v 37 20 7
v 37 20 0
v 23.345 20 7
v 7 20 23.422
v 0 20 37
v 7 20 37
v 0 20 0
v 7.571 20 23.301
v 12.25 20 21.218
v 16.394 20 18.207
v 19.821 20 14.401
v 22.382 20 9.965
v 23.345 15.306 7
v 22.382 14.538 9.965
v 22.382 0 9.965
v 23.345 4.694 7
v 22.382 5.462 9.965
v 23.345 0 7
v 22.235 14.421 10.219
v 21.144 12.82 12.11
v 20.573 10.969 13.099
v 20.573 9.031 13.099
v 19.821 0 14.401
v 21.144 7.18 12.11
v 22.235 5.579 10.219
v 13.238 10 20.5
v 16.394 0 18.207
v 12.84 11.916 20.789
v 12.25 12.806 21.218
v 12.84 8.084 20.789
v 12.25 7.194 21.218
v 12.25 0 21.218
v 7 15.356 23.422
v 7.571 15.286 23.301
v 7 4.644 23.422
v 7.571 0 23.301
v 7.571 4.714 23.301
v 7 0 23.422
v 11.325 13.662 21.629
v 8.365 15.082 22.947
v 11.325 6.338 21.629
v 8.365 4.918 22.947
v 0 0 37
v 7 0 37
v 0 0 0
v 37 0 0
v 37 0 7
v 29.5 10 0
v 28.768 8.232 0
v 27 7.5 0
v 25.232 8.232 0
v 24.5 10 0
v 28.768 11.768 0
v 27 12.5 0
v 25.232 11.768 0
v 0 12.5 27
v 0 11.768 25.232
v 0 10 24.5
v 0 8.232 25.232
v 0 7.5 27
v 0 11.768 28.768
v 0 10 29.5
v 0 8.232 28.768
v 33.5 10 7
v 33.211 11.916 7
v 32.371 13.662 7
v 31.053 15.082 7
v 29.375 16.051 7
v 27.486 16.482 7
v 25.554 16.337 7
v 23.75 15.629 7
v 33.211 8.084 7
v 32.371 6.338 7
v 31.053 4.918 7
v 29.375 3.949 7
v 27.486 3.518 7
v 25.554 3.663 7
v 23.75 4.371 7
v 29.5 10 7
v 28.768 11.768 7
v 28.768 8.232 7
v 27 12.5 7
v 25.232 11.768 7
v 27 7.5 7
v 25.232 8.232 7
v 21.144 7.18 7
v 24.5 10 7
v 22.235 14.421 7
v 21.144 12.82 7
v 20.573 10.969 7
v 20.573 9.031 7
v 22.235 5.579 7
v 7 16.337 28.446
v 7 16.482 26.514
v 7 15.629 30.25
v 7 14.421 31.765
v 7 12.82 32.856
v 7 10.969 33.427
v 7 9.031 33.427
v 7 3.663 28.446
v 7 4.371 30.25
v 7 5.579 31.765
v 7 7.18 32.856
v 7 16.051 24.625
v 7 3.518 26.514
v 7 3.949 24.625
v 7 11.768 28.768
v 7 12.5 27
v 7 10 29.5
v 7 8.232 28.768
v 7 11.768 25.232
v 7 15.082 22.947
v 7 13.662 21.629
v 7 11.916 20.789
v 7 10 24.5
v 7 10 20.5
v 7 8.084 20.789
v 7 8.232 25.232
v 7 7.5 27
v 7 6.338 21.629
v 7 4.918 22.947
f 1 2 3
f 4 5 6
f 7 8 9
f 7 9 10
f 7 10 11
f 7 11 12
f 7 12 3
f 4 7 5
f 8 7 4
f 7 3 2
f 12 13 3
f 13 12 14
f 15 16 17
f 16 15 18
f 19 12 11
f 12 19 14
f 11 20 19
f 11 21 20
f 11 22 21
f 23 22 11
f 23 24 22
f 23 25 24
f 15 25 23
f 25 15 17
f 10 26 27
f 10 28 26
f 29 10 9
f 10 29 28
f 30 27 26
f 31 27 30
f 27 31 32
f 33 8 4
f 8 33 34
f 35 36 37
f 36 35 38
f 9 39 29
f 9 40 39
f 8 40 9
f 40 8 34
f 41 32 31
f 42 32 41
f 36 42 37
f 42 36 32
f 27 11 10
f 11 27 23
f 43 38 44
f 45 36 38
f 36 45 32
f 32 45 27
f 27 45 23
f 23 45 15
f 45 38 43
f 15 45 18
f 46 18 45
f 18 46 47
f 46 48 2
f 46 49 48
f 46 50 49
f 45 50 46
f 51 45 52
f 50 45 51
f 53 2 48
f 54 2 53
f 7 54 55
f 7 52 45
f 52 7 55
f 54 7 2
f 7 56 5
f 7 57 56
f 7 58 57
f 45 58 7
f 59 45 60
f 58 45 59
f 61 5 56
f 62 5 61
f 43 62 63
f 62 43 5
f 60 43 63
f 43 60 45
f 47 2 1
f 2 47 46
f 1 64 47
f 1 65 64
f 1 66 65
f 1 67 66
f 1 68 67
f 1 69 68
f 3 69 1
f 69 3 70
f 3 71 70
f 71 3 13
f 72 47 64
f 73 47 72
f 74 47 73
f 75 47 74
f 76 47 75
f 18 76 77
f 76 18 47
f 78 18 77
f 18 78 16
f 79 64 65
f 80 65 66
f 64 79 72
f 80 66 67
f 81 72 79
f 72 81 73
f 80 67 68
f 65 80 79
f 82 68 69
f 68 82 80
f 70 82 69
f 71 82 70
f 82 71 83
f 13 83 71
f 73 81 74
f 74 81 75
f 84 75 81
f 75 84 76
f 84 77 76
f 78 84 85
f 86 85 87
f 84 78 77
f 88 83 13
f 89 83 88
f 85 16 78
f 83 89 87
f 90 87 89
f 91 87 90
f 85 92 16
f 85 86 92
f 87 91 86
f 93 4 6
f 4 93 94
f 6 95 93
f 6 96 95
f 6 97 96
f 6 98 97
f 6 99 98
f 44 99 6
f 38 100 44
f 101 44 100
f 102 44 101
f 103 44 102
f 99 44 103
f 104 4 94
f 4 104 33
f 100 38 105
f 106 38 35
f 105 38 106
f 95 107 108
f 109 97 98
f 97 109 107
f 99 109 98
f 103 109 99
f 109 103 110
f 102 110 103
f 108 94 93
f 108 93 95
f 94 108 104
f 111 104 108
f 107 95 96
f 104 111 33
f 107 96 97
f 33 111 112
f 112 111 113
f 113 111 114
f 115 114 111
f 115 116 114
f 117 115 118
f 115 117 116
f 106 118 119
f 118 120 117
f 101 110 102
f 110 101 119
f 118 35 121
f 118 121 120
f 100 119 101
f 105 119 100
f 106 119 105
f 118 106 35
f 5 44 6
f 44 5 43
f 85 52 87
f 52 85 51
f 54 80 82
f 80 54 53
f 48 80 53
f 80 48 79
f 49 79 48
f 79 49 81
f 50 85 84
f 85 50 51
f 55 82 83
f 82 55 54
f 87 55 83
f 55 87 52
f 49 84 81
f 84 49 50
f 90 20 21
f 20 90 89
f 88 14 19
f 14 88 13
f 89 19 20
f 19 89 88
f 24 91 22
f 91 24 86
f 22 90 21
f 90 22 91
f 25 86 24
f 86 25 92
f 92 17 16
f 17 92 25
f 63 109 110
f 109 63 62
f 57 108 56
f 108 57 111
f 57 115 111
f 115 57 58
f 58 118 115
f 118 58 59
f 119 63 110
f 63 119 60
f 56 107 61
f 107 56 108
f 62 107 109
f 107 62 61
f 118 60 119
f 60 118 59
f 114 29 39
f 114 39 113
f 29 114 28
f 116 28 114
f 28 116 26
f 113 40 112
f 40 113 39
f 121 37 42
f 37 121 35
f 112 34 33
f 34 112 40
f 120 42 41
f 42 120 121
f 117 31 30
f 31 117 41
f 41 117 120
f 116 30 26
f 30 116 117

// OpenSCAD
// file: configuration.scad
// Copyright (C) 2012 t00tie
// Adapto is licensed under the Creative Commons - GNU GPL license.
// http://creativecommons.org/licenses/GPL/2.0/

// Configuration file for Adapto OpenSCAD files

boltOuterRadius=5/2;// outer radius of bolt threads, 5 for M5 bolts
boltLength=60;//bolt length without head (threaded part only)
washerOuterRadius=13/2;// washers that fit the bolts
washerLength=10;// this is large because it is used to make holes for washers

frameX=20;// width of frame parts (alu, wood etc.)
frameY=20;// ditto

boltOffset=frameX/2;// How far in the bolt holes go, may need tweaking if framX!=frameY

smoothRod=8;// diameter of smooth rods


// Copied from 
// PRUSA Mendel  
// Default metric sizes
// GNU GPL v3
// Josef Průša
// josefprusa@me.com
// prusadjs.cz
// http://www.reprap.org/wiki/Prusa_Mendel
// http://github.com/prusajr/PrusaMendel
m3_nut_diameter = 5.3;
m3_nut_diameter_bigger = ((m3_nut_diameter  / 2) / cos (180 / 6))*2;
// file: bolt.scad
include <configuration.scad>;

module bolt(){
	union(){
		translate([0, 0, -boltLength]) cylinder(r=boltOuterRadius, h=boltLength+1);
		cylinder(r=washerOuterRadius, h=washerLength);
	}
}

// a bolt and washer intended for making equivalent holes
// the parameter from indicates which side the bolt is inserted from
module boltWasher(from="x-"){
	if(from=="x+"){
		rotate([0, 90, 0]) bolt();
	} else
	if(from=="x-"){
		rotate([0, -90, 0]) bolt();
	} else
	if(from=="y+"){
		rotate([-90, 0, 0]) bolt();
	} else
	if(from=="y-"){
		rotate([90, 0, 0]) bolt();
	} else
	if(from=="z+"){
		rotate([0, 0, 0]) bolt();
	} else
	if(from=="z-"){
		rotate([180, 0, 0]) bolt();
	}
}

boltWasher("x-");
// main file
w=20;
l=37;
b=7;
bolt_r=5/2;

use <bolt.scad>;

difference(){
	union(){
		cube([l, w, b]);
		cube([b, w, l]);
		intersection(){
			rotate([-90,0,0]) cylinder(r=l-bolt_r-w/2, h=w);
			cube([l,w,l]);
		}
	}
	translate([l-w/2, w/2, b]) boltWasher("z+");
	translate([b, w/2, l-w/2]) boltWasher("x+");
}
